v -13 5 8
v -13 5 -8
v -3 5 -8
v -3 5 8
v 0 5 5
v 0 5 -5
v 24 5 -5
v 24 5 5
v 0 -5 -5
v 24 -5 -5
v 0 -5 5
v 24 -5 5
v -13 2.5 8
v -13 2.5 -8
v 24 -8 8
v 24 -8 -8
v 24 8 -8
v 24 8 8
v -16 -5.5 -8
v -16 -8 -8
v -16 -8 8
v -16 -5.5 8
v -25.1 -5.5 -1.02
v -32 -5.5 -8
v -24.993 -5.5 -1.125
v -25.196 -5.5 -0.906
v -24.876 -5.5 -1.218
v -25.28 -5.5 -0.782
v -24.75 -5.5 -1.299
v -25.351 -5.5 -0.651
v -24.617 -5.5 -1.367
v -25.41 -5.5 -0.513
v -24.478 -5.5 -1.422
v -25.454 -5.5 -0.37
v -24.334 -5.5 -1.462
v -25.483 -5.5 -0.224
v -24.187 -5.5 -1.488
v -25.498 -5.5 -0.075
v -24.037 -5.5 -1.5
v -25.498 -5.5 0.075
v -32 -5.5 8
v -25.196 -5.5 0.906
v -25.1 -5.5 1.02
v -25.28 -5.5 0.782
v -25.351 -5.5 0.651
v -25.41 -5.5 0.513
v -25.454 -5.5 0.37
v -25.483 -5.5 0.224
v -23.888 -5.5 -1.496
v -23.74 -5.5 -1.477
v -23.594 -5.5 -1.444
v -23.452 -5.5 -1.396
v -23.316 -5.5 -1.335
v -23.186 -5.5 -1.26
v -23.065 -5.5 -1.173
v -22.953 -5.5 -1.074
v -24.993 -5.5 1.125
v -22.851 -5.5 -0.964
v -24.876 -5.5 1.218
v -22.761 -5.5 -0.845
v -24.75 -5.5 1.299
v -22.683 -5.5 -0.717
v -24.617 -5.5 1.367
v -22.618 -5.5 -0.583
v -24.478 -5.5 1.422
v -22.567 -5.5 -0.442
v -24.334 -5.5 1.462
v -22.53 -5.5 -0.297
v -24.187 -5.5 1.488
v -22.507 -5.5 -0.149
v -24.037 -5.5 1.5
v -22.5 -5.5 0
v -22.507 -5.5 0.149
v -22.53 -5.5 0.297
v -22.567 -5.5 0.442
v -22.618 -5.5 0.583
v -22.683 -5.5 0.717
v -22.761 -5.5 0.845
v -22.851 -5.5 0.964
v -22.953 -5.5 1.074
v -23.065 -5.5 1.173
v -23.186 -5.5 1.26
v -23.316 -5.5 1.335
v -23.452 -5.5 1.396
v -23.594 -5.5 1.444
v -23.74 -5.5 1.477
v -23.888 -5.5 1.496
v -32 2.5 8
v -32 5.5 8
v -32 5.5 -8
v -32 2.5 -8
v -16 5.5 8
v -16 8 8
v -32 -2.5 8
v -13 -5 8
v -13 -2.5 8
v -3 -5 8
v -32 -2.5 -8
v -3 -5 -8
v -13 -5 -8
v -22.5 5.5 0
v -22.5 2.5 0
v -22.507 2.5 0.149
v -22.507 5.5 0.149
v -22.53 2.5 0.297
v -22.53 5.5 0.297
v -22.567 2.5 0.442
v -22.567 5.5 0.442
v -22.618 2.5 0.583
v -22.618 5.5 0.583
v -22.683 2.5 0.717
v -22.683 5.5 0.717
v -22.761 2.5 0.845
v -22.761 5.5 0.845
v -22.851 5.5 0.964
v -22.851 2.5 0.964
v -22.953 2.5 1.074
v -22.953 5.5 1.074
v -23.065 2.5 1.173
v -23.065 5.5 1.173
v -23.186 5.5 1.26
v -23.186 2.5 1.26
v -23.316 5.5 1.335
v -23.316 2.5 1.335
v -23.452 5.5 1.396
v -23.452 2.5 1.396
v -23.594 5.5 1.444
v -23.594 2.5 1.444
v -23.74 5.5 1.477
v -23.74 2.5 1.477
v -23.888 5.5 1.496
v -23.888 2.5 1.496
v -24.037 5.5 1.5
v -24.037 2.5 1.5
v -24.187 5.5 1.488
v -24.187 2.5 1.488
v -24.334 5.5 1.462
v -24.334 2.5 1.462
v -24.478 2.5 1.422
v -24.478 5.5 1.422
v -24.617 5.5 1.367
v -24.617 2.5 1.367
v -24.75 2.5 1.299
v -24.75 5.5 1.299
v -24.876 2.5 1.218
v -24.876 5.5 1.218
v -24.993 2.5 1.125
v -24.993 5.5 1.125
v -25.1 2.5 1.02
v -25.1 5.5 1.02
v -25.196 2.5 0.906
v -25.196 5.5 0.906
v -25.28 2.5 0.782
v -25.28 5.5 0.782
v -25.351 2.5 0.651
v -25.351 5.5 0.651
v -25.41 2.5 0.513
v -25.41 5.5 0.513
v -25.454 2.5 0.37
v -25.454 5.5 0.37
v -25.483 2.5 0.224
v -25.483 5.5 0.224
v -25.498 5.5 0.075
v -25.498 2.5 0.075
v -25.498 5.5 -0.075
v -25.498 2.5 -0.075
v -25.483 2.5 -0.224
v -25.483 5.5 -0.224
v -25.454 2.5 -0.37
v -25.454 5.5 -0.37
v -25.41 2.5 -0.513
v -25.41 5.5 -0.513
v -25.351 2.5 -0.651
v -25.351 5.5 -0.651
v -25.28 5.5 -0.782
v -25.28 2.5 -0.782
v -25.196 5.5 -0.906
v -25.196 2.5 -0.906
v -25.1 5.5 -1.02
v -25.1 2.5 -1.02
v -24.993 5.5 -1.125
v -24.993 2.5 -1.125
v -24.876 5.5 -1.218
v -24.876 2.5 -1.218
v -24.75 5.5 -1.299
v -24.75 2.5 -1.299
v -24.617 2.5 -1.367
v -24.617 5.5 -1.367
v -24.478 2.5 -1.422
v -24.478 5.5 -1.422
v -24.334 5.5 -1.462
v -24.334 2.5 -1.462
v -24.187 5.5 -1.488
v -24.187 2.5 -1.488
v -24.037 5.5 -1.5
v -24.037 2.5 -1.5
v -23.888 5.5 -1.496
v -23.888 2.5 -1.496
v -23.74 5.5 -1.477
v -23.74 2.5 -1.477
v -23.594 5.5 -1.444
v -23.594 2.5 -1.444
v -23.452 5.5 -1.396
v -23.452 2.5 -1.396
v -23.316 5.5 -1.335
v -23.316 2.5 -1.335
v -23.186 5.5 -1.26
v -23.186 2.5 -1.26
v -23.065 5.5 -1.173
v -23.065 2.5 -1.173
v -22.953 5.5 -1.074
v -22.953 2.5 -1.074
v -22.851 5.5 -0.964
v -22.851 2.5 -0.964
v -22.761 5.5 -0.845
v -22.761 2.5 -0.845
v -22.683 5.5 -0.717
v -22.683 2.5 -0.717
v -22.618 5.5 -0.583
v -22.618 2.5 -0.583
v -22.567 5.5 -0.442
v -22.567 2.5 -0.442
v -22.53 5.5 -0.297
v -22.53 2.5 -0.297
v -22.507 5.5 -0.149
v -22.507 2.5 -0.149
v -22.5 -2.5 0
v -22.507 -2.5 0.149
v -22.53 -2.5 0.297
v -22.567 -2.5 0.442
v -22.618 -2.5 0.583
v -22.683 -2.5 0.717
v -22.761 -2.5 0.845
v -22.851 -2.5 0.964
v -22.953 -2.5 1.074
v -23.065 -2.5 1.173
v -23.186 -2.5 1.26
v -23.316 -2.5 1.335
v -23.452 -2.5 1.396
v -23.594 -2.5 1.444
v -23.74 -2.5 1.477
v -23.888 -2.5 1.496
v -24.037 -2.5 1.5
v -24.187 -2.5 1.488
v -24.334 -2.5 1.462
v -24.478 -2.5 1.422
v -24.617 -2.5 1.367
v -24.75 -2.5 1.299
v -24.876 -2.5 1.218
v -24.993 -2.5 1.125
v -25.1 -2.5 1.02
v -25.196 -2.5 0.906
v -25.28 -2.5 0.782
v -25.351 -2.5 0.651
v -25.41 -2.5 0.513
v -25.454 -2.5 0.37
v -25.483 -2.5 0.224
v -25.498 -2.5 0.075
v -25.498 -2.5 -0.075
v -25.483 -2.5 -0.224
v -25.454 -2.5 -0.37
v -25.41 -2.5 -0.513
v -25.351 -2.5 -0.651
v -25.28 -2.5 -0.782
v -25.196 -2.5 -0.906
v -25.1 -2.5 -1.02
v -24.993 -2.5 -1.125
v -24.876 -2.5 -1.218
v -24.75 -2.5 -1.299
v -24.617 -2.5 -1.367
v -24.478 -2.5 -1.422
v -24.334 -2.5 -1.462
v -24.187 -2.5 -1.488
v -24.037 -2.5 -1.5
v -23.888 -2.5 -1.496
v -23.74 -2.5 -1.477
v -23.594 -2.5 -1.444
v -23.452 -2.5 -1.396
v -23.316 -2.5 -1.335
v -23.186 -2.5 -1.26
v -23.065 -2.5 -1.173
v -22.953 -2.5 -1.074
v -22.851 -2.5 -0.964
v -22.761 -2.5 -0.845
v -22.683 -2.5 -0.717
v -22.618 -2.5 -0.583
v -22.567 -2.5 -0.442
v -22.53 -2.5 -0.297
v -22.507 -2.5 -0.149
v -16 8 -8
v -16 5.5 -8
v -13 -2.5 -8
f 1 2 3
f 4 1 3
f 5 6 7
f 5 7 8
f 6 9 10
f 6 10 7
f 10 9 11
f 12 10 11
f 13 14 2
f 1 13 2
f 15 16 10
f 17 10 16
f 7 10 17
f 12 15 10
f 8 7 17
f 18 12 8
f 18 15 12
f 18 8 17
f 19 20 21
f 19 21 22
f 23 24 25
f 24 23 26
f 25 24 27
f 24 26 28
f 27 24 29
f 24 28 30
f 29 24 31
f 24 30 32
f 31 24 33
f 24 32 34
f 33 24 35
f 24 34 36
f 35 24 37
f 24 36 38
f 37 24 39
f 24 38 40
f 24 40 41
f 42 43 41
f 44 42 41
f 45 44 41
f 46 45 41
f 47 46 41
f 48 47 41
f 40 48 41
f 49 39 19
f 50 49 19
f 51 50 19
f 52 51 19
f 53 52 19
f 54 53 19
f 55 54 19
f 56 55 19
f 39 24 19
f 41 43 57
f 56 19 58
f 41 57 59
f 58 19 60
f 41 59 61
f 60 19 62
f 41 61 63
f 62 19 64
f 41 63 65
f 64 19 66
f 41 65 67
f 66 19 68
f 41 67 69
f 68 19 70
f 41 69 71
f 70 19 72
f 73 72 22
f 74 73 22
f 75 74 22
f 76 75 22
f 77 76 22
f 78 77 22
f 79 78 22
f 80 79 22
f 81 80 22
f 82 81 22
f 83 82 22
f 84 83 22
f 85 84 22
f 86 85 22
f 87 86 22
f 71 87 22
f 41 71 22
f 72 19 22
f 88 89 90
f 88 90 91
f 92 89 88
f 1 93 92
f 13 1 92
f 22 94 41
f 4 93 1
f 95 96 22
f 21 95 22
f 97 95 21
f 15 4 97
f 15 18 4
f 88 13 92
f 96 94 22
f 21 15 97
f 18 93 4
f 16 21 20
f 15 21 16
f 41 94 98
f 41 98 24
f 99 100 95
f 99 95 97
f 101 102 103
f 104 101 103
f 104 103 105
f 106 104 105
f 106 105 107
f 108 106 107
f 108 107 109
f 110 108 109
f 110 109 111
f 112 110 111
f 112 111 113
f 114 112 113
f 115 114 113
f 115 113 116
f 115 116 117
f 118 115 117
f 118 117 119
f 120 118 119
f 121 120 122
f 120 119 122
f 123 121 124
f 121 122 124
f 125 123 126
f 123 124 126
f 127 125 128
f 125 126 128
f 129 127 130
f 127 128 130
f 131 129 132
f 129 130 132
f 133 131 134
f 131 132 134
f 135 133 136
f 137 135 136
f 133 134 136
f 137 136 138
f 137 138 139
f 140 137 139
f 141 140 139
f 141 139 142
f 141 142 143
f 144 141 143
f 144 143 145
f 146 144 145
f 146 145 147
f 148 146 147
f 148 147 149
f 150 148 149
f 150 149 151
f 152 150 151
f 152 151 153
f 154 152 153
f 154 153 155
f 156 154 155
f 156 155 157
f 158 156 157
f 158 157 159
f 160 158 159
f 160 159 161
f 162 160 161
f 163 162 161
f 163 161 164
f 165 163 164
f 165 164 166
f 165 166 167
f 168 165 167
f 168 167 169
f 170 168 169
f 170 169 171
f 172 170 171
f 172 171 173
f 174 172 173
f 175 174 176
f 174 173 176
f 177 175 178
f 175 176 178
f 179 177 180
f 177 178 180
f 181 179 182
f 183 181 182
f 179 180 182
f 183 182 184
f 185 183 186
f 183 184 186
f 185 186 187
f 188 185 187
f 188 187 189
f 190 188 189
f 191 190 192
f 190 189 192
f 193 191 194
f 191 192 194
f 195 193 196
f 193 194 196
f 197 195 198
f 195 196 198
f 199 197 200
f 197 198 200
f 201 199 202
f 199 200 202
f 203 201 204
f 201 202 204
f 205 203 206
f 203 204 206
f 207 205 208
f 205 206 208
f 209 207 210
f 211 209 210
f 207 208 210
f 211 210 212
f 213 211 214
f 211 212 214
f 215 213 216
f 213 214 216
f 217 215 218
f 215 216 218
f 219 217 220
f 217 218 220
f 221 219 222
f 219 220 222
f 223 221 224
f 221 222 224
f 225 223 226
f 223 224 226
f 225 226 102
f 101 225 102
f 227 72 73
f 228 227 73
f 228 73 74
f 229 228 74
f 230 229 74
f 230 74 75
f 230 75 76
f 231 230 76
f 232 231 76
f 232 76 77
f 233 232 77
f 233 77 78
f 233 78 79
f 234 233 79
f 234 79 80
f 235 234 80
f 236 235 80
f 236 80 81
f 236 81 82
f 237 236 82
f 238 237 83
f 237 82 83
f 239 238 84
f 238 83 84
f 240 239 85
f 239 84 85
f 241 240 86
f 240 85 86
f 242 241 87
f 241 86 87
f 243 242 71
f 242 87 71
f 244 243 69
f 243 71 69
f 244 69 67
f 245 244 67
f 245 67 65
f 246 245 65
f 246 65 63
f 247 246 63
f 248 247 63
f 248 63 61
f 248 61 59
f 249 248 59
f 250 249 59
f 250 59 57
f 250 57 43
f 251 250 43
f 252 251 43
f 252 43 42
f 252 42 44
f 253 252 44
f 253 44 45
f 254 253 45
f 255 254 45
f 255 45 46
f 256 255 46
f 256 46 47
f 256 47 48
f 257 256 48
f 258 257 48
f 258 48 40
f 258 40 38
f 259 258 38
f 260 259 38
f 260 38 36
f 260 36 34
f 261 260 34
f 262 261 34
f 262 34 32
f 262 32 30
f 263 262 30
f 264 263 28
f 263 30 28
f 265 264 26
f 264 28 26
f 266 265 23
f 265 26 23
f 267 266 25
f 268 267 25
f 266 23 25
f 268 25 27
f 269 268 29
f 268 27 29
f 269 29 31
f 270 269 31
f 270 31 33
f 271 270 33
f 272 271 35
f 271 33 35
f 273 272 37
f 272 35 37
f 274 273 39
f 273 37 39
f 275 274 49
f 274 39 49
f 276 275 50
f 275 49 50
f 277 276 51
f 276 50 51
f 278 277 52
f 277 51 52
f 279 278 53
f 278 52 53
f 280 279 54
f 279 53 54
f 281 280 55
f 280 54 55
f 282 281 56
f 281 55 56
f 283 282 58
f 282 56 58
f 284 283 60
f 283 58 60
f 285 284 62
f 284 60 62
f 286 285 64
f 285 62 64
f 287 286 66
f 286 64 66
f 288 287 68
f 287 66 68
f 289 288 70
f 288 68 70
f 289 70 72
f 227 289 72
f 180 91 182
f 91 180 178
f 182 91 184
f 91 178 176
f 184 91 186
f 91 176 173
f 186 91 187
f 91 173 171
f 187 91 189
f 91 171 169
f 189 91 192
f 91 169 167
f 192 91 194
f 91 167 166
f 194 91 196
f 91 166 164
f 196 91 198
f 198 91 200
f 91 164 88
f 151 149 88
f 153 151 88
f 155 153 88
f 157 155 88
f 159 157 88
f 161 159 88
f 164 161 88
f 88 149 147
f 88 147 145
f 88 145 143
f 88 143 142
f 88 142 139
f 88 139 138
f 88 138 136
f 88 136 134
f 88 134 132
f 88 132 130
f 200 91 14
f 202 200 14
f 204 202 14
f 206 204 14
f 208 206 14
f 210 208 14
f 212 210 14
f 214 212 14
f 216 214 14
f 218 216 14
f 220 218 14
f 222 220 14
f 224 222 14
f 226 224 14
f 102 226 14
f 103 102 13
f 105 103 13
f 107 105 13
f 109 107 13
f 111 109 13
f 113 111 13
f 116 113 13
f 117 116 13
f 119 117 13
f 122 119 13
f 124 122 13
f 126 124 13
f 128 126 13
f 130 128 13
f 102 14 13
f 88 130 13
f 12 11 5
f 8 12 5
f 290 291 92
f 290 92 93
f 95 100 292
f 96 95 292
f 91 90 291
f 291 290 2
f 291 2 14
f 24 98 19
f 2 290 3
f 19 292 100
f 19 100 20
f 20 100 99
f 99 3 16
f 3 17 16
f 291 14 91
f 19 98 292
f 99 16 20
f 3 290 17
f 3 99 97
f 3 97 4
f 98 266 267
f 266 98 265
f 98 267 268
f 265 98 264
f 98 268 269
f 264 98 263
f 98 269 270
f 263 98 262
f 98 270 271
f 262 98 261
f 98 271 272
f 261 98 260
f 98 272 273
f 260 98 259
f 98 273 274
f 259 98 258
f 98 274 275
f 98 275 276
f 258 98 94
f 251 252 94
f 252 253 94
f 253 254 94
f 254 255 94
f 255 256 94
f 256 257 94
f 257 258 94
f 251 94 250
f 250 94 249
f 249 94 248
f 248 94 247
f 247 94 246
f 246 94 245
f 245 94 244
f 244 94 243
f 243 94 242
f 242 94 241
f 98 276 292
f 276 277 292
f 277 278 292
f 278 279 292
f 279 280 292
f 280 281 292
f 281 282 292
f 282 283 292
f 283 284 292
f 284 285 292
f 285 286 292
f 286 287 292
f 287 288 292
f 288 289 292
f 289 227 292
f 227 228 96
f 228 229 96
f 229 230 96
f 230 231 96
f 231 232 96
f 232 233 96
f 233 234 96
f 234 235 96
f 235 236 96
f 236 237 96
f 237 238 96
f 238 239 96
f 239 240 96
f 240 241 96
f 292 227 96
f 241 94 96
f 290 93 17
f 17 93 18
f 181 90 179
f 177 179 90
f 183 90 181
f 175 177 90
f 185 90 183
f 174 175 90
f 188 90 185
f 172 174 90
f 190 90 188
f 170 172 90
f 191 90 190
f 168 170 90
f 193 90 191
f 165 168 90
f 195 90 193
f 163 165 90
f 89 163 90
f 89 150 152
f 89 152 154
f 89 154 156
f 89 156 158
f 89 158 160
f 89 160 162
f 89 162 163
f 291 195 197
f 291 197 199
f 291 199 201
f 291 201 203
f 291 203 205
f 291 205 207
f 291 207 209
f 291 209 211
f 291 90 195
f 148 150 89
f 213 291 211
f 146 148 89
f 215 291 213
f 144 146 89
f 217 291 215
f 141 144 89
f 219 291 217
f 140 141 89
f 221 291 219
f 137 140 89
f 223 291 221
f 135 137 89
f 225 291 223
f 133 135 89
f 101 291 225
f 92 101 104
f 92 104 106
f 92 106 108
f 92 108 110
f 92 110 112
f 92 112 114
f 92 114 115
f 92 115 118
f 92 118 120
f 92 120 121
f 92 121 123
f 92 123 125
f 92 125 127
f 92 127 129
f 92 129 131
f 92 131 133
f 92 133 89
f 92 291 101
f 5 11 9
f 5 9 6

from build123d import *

# Parameters (mm, degrees)
F0_W     = 16
F0_H     = 16
F0_W_2   = 10
F0_H_2   = 10
F1_DEPTH = 24
F2_W     = 16
F2_H     = 16
F2_W_2   = 10
F2_H_2   = 10
F3_DEPTH = 16
F4_W     = 3
F4_H     = 5
F5_DEPTH = 25
F6_W     = 3
F6_H     = 16
F7_DEPTH = 16
F8_R     = 1.5
F9_DEPTH = 13.501


with BuildPart() as f1:
    # F0 (on Right) → F1 (new body)
    with BuildSketch(Plane.YZ):
        Rectangle(F0_W, F0_H)
        Rectangle(F0_W_2, F0_H_2, mode=Mode.SUBTRACT)
    extrude(amount=F1_DEPTH)

    # F2 (on face) → F3 (join)
    with BuildSketch(Plane.XY.offset(8)):
        with Locations((-8, 0)):
            Rectangle(F2_W, F2_H)
        with Locations((-8, 0)):
            Rectangle(F2_W_2, F2_H_2, mode=Mode.SUBTRACT)
    extrude(amount=-F3_DEPTH)

    # F4 (on face) → F5 (cut)
    with BuildSketch(Plane.XY.offset(8)):
        with Locations((-14.5, 0)):
            Rectangle(F4_W, F4_H)
    extrude(amount=-F5_DEPTH, mode=Mode.SUBTRACT)

    # F6 (on face) → F7 (join)
    with BuildSketch(Plane(origin=(-16, 0, 0), x_dir=(0, -1, 0), z_dir=(-1, 0, 0))):
        with Locations((-4, 0)):
            Rectangle(F6_W, F6_H)
        with Locations((4, 0)):
            Rectangle(F6_W, F6_H)
    extrude(amount=F7_DEPTH)

    # F8 (on face) → F9 (cut, through all)
    with BuildSketch(Plane.XZ.offset(5.5)):
        with Locations((-24, 0)):
            Circle(F8_R)
    extrude(amount=-F9_DEPTH, mode=Mode.SUBTRACT)


solid = f1.part
